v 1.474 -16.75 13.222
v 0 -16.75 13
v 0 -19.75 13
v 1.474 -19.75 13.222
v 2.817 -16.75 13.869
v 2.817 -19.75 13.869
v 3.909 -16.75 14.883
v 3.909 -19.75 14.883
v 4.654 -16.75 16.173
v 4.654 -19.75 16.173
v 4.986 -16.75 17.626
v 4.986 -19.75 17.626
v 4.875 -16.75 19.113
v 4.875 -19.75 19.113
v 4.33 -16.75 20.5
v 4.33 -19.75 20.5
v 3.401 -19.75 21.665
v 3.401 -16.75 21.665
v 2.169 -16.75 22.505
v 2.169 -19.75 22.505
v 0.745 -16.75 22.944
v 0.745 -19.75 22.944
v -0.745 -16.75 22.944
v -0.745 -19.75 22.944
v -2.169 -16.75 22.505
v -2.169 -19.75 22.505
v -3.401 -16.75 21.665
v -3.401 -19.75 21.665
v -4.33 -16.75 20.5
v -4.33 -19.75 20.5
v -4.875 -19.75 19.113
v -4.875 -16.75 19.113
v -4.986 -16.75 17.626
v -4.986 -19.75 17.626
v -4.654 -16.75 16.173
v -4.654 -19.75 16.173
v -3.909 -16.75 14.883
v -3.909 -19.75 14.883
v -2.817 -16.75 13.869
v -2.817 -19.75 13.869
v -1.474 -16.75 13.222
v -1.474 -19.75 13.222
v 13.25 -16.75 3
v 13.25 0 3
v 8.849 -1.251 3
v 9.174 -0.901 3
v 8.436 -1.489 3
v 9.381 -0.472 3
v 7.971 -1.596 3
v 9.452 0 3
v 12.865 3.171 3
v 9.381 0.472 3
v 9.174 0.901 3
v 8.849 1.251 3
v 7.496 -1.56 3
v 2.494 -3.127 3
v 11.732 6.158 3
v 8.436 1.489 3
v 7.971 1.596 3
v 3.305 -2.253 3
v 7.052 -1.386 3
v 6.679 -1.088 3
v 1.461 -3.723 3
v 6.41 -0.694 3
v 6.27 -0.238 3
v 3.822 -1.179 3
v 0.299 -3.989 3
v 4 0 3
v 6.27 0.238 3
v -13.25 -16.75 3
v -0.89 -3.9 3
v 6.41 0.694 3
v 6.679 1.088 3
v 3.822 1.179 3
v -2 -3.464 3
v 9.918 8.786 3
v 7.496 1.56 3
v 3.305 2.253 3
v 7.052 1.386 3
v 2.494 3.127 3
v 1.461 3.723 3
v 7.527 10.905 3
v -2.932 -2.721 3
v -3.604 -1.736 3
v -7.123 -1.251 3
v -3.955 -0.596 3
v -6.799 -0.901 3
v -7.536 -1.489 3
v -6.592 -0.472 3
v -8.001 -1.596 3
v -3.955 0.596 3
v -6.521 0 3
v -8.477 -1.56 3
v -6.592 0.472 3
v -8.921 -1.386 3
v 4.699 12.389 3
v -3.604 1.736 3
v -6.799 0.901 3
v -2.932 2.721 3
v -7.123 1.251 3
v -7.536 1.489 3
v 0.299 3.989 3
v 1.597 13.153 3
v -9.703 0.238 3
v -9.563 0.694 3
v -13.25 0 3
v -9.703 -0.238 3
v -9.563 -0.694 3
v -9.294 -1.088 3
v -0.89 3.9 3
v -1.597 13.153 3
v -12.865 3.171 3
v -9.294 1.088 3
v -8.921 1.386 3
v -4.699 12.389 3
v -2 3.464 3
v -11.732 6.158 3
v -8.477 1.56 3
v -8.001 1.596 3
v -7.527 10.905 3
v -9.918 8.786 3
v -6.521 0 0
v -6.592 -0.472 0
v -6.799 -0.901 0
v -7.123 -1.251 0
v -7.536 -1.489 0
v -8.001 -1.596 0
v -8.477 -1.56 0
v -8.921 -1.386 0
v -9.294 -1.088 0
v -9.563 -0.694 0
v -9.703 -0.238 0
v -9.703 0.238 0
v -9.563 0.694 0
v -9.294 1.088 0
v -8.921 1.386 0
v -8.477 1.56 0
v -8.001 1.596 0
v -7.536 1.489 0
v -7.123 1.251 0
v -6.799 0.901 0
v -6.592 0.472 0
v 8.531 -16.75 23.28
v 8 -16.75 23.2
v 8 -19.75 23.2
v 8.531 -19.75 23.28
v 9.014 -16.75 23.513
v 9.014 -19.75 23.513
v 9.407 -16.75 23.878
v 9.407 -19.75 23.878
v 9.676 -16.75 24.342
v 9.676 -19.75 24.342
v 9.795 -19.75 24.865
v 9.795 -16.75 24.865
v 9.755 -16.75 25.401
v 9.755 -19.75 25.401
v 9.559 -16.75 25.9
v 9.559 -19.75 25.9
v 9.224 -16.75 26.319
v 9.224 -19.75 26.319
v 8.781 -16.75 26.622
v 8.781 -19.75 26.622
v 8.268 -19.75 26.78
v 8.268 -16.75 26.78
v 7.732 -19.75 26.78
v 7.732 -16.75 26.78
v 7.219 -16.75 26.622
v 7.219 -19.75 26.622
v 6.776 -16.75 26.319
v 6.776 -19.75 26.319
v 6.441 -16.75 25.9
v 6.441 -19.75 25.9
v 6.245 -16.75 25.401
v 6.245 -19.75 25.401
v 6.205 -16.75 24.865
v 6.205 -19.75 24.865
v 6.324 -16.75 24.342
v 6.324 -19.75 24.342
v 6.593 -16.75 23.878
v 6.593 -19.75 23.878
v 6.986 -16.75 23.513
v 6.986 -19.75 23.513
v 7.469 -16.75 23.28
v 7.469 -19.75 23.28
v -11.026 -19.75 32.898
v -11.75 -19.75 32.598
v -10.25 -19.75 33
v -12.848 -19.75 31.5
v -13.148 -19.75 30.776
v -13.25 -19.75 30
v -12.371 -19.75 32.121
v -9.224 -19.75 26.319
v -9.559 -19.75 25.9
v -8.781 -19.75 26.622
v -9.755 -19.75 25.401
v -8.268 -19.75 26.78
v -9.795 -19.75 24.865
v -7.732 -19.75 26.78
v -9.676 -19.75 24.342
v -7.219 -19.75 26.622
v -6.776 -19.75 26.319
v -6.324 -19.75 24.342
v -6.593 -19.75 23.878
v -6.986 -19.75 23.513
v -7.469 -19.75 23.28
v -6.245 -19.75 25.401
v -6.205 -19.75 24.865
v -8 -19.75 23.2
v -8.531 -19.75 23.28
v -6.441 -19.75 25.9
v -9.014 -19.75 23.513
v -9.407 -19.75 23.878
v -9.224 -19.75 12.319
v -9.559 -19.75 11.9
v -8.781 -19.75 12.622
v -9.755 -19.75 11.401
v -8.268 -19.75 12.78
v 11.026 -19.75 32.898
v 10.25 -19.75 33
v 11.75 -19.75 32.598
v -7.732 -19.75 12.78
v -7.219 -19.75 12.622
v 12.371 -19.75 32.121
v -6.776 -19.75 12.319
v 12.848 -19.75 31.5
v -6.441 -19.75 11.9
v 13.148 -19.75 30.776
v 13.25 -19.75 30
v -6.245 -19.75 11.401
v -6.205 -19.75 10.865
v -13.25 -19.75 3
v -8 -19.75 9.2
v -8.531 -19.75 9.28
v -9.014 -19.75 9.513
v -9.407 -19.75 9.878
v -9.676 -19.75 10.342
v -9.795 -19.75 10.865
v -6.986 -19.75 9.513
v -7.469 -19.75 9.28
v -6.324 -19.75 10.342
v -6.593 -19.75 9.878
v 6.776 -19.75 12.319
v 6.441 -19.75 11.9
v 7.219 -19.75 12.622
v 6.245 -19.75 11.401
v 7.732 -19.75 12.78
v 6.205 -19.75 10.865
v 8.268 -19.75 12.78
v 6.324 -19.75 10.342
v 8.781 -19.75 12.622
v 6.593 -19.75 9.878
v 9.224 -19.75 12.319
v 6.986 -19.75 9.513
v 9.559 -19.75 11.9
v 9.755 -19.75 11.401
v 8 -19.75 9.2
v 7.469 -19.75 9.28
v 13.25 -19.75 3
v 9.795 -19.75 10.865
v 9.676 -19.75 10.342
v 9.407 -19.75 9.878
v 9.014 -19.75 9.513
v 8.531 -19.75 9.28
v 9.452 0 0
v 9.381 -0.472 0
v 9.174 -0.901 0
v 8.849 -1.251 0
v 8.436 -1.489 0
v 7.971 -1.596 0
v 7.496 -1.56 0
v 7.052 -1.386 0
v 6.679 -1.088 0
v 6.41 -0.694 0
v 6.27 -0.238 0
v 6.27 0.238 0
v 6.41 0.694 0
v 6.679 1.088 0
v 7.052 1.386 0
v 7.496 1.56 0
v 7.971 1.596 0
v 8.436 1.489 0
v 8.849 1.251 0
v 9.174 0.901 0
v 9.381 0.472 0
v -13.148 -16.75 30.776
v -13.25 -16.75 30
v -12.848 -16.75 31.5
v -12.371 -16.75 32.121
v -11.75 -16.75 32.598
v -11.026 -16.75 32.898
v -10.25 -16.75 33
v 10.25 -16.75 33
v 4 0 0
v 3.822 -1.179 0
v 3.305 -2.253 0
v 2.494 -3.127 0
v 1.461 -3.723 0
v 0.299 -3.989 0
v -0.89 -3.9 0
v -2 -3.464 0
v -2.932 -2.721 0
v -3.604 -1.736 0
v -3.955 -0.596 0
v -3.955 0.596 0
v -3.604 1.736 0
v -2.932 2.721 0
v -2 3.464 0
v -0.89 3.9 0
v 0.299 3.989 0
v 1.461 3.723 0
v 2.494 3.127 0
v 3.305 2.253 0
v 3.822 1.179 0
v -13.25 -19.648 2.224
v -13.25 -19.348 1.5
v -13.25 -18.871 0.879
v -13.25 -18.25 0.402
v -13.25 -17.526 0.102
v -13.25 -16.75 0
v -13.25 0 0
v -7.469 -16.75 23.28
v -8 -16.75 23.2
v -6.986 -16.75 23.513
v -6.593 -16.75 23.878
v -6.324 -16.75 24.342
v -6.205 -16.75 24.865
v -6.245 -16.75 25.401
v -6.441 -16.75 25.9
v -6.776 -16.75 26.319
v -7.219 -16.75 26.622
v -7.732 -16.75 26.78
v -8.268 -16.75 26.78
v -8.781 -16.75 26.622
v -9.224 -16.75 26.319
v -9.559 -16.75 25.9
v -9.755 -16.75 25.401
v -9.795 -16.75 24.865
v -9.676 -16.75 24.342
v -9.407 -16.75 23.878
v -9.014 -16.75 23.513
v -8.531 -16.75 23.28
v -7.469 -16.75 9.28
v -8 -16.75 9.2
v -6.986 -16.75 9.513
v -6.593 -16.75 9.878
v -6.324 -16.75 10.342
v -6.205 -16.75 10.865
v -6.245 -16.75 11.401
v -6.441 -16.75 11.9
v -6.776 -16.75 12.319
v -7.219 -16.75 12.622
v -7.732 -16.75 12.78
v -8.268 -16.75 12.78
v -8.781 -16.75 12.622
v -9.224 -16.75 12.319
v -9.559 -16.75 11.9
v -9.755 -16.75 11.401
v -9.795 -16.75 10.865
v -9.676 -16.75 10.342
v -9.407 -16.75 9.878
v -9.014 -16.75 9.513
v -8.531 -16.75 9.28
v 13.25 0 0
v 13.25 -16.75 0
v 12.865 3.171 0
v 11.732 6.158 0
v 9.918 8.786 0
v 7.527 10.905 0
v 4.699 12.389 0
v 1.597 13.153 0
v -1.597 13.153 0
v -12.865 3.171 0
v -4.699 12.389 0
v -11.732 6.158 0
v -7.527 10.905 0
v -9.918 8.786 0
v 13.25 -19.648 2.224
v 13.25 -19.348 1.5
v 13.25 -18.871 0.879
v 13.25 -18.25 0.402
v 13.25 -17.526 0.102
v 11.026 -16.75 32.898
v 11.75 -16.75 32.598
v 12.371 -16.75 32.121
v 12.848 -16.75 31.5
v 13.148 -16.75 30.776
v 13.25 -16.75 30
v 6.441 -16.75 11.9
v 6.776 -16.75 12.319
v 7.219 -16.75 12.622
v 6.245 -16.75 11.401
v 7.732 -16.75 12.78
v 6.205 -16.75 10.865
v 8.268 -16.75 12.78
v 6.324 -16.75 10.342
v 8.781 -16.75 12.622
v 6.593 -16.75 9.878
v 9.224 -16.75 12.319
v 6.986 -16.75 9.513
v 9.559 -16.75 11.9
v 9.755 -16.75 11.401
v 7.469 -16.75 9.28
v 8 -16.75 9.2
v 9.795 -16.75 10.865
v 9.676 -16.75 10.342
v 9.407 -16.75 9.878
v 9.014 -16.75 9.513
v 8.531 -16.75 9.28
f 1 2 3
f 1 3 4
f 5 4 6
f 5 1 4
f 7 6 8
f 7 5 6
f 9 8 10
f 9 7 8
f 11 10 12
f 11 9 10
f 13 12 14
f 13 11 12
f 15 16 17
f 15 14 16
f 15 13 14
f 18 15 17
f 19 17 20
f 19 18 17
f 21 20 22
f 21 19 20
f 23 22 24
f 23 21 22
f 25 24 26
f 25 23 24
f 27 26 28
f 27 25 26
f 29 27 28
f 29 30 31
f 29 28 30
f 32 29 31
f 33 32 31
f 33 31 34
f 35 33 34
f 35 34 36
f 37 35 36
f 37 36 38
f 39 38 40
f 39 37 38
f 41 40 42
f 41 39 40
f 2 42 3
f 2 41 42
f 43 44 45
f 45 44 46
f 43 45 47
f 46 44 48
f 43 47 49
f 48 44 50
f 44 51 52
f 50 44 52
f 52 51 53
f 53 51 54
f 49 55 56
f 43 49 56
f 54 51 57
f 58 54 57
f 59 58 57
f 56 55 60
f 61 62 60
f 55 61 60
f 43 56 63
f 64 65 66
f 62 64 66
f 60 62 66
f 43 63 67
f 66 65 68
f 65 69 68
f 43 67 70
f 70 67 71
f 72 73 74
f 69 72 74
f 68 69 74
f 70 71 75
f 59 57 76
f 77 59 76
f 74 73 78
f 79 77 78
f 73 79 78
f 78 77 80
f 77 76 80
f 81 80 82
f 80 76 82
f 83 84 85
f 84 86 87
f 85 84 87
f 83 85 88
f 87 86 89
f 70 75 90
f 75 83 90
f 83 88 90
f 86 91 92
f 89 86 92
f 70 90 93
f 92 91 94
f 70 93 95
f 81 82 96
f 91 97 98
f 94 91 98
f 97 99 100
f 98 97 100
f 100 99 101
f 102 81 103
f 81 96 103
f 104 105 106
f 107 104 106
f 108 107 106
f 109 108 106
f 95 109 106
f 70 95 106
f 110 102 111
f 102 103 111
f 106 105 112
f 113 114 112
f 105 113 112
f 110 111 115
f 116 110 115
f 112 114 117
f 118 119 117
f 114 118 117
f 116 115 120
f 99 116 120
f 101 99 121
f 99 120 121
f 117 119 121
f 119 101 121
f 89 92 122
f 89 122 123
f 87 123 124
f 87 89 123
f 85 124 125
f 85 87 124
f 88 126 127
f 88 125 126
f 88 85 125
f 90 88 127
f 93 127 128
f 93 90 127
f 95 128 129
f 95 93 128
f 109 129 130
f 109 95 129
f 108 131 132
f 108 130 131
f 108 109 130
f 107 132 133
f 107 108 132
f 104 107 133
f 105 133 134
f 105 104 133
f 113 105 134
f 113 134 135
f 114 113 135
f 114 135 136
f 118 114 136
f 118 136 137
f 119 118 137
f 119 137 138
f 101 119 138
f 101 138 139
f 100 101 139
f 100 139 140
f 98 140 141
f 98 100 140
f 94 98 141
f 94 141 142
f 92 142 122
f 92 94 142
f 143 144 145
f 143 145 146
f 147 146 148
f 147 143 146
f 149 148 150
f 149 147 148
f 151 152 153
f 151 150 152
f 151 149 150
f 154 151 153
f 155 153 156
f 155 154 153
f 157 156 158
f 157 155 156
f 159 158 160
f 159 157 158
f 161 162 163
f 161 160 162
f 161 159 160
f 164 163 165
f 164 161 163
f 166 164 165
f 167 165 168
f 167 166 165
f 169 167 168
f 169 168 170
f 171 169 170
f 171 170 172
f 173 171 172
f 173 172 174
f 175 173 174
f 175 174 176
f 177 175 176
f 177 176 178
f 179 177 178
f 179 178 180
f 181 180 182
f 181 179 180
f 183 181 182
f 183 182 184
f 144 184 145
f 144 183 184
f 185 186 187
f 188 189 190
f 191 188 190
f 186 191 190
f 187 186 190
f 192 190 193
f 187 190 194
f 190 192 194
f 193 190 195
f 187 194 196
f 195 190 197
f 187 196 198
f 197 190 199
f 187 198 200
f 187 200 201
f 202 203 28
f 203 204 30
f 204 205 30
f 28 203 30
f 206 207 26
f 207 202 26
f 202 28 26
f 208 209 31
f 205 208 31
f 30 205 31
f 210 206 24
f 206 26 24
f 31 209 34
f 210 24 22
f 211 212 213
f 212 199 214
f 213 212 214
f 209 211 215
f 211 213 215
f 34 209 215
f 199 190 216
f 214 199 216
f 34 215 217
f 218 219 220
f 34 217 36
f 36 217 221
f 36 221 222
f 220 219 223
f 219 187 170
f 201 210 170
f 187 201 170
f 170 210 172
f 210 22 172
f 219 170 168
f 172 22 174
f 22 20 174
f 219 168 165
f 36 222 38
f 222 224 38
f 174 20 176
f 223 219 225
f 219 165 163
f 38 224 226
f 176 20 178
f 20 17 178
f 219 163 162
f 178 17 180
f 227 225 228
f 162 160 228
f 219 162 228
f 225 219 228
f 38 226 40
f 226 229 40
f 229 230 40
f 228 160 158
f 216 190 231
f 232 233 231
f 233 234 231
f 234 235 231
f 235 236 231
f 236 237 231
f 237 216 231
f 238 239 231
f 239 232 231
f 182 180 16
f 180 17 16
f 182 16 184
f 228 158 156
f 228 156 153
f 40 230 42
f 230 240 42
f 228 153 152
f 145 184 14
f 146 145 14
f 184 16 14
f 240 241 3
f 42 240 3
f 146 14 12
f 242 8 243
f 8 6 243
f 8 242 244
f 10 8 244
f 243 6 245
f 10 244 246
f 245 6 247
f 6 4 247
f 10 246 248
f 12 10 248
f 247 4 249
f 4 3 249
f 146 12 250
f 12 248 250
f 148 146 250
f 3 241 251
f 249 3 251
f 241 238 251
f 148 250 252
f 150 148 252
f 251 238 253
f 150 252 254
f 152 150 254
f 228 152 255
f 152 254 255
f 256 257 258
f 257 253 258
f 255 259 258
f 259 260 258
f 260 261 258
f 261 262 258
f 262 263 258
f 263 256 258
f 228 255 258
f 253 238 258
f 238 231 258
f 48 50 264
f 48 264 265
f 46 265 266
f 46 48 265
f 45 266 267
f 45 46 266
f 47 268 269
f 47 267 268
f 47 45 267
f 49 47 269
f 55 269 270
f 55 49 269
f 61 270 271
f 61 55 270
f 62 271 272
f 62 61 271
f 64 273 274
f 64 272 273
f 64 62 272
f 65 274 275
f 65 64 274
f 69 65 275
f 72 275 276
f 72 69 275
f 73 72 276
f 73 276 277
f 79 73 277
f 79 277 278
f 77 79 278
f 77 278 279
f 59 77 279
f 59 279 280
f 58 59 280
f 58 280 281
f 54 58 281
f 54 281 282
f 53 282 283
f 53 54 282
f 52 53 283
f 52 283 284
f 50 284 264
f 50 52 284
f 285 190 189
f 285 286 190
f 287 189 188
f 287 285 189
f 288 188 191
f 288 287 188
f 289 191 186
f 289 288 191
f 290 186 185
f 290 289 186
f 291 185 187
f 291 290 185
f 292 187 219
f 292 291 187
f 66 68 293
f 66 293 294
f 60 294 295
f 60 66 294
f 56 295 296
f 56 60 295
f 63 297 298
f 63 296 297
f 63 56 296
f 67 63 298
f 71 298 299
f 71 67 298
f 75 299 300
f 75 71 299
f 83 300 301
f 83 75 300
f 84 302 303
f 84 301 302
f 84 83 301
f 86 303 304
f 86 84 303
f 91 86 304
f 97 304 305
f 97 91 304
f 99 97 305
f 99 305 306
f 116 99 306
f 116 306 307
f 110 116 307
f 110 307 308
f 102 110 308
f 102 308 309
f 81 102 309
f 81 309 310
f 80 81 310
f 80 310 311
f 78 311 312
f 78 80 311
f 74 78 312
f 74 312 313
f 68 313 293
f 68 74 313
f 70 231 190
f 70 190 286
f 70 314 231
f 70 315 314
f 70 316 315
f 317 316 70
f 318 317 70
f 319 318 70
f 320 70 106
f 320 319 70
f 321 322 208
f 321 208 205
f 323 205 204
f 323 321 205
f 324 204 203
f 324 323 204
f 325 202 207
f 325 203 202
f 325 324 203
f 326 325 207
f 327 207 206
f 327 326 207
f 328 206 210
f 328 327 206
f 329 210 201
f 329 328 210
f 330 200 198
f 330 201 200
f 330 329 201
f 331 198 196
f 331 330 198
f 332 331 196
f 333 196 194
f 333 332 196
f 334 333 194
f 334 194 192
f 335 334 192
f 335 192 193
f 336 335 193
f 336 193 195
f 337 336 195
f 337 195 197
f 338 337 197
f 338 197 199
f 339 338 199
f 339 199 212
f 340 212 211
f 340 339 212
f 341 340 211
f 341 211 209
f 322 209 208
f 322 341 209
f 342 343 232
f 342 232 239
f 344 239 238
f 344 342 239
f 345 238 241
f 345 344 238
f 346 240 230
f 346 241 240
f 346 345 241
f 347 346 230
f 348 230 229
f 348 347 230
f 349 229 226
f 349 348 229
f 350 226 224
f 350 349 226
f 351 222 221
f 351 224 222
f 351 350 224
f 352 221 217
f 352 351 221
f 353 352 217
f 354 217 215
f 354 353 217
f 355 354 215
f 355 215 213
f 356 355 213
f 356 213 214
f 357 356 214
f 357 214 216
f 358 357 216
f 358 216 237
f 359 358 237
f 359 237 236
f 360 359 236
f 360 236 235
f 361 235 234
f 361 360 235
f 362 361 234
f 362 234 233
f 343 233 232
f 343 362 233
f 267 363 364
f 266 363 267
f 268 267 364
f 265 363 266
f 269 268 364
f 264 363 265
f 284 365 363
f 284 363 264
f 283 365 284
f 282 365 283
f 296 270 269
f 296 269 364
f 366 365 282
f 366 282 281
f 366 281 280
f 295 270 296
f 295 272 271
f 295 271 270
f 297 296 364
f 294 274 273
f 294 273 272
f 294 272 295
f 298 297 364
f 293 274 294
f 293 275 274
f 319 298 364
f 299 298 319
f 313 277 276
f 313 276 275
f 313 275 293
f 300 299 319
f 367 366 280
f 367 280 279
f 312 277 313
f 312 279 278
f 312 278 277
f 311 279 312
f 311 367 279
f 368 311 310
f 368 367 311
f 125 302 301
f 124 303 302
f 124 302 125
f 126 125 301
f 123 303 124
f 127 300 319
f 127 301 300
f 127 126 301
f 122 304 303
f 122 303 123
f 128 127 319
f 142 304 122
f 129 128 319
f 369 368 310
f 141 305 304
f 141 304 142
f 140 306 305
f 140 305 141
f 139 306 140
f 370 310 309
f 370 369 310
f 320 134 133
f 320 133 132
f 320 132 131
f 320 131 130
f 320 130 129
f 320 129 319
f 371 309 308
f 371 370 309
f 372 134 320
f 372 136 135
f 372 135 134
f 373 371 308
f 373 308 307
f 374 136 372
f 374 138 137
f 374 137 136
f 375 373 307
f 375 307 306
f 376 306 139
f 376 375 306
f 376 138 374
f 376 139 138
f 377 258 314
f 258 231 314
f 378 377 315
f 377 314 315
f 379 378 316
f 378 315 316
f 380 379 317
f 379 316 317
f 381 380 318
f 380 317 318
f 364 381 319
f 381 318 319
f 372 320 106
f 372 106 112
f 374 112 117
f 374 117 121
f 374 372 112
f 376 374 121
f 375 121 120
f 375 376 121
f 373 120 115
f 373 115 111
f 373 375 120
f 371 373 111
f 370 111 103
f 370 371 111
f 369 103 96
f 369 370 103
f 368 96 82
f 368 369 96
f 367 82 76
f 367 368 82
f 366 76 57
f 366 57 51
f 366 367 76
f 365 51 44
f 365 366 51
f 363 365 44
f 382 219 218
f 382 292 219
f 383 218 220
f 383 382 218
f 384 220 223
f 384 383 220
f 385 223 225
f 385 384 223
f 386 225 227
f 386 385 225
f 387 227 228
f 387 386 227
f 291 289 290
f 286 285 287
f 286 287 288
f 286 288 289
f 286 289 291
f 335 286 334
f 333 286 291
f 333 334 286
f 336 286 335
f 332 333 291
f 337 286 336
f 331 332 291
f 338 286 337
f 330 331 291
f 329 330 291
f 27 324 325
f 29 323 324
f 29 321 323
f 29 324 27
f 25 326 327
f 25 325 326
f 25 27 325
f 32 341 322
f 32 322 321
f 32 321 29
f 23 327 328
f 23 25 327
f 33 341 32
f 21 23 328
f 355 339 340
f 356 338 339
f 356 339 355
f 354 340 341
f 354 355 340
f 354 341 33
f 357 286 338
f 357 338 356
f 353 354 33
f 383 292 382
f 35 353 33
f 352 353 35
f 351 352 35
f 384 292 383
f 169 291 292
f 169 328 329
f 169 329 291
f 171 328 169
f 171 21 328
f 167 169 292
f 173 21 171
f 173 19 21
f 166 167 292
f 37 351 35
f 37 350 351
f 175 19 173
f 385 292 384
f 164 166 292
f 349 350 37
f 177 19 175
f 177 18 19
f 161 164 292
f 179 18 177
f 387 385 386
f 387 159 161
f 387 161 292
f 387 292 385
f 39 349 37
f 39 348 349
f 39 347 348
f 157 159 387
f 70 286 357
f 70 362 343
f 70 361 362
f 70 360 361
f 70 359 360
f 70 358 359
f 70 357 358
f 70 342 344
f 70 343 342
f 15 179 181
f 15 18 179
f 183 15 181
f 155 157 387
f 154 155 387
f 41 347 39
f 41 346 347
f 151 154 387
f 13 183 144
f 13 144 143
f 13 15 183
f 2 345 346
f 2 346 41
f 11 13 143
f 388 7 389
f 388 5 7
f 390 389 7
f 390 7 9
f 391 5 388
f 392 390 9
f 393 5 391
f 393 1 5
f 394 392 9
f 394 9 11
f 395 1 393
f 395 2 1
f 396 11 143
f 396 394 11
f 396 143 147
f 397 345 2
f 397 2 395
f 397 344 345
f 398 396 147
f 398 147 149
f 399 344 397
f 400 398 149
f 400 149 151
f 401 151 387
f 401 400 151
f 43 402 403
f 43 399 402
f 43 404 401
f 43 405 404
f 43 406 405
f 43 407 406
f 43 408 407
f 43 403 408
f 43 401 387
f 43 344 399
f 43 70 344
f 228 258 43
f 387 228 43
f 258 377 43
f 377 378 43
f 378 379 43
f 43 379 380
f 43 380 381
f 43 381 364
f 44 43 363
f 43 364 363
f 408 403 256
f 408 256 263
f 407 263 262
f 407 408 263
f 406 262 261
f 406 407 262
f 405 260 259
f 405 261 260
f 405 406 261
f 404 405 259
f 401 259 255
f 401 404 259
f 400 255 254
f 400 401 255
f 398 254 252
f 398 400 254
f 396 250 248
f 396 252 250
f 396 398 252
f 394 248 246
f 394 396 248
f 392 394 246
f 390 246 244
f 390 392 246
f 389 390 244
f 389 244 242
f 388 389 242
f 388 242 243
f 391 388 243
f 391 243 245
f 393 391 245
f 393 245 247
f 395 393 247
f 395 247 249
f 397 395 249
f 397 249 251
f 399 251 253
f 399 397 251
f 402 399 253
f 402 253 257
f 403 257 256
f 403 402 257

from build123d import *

# Parameters (mm, degrees)
EXTRUDE_1_DEPTH          = 3
SKETCH_2_W               = 26.5
SKETCH_2_H               = 3
EXTRUDE_2_DEPTH          = 30
FILLET_1_R               = 3
FILLET_2_R               = 3
CUT_EXTRUDE_1_DEPTH      = 41.677082
CUT_EXTRUDE_1_DEPTH_BACK = 41.677082
SKETCH_3_R               = 4
CUT_EXTRUDE_2_DEPTH      = 41.677082
CUT_EXTRUDE_2_DEPTH_BACK = 41.677082
SKETCH_4_R               = 1.6
CUT_EXTRUDE_3_DEPTH      = 49.513529041
CUT_EXTRUDE_3_DEPTH_BACK = 49.513529041
SKETCH_5_R               = 5
CUT_EXTRUDE_4_DEPTH      = 49.513529041
CUT_EXTRUDE_4_DEPTH_BACK = 49.513529041
SKETCH_6_R               = 1.8


with BuildPart() as part:
    # 草图1 → 凸台-拉伸1 (new body)
    with BuildSketch(Plane.XY):
        with BuildLine():
            Line((13.25, 0), (13.25, -19.75))
            Line((13.25, -19.75), (-13.25, -19.75))
            Line((-13.25, -19.75), (-13.25, 0))
            ThreePointArc((-13.25, 0), (0, 13.25), (13.25, 0))
        make_face()
    extrude(amount=EXTRUDE_1_DEPTH)

    # 草图2 → 凸台-拉伸2 (add)
    with BuildSketch(Plane.XY.offset(3)):
        with Locations((0, -18.25)):
            Rectangle(SKETCH_2_W, SKETCH_2_H)
    extrude(amount=EXTRUDE_2_DEPTH)

    # 圆角1
    fillet_1_edges = [part.edges().sort_by_distance(p)[0] for p in [
        (0, -19.75, 0),
    ]]
    fillet(fillet_1_edges, radius=FILLET_1_R)

    # 圆角2
    fillet_2_edges = [part.edges().sort_by_distance(p)[0] for p in [
        (-13.25, -18.25, 33),
        (13.25, -18.25, 33),
    ]]
    fillet(fillet_2_edges, radius=FILLET_2_R)

    # 草图3 → 切除-拉伸1 (cut, two sides: drawn at the far end of the back side and taken through both)
    with BuildSketch(Plane(origin=(0, 0, 0), x_dir=(-1, 0, 0), z_dir=(0, 0, -1)).offset(-CUT_EXTRUDE_1_DEPTH_BACK)):
        with Locations(Location((0, 0, 0), (0, 0, 180))):
            Circle(SKETCH_3_R)
    extrude(amount=CUT_EXTRUDE_1_DEPTH + CUT_EXTRUDE_1_DEPTH_BACK, mode=Mode.SUBTRACT)

    # 草图4 → 切除-拉伸2 (cut, two sides: drawn at the far end of the back side and taken through both)
    with BuildSketch(Plane(origin=(0, 0, 0), x_dir=(-1, 0, 0), z_dir=(0, 0, -1)).offset(-CUT_EXTRUDE_2_DEPTH_BACK)):
        with Locations(Location((8.121035447, 0, 0), (0, 0, 180))):
            Circle(SKETCH_4_R)
        with Locations(Location((-7.851829852, 0, 0), (0, 0, 180))):
            Circle(SKETCH_4_R)
    extrude(amount=CUT_EXTRUDE_2_DEPTH + CUT_EXTRUDE_2_DEPTH_BACK, mode=Mode.SUBTRACT)

    # 草图5 → 切除-拉伸3 (cut, two sides: drawn at the far end of the back side and taken through both)
    with BuildSketch(Plane(origin=(0, -19.75, 0), x_dir=(-1, 0, 0), z_dir=(0, -1, 0)).offset(-CUT_EXTRUDE_3_DEPTH_BACK)):
        with Locations(Location((0, -18, 0), (0, 0, 90))):
            Circle(SKETCH_5_R)
    extrude(amount=CUT_EXTRUDE_3_DEPTH + CUT_EXTRUDE_3_DEPTH_BACK, mode=Mode.SUBTRACT)

    # 草图6 → 切除-拉伸4 (cut, two sides: drawn at the far end of the back side and taken through both)
    with BuildSketch(Plane(origin=(0, -19.75, 0), x_dir=(-1, 0, 0), z_dir=(0, -1, 0)).offset(-CUT_EXTRUDE_4_DEPTH_BACK)):
        with Locations(Location((-8, -11, 0), (0, 0, 90))):
            Circle(SKETCH_6_R)
        with Locations(Location((8, -11, 0), (0, 0, 90))):
            Circle(SKETCH_6_R)
        with Locations(Location((8, -25, 0), (0, 0, 90))):
            Circle(SKETCH_6_R)
        with Locations(Location((-8, -25, 0), (0, 0, 90))):
            Circle(SKETCH_6_R)
    extrude(amount=CUT_EXTRUDE_4_DEPTH + CUT_EXTRUDE_4_DEPTH_BACK, mode=Mode.SUBTRACT)


solid = part.part
